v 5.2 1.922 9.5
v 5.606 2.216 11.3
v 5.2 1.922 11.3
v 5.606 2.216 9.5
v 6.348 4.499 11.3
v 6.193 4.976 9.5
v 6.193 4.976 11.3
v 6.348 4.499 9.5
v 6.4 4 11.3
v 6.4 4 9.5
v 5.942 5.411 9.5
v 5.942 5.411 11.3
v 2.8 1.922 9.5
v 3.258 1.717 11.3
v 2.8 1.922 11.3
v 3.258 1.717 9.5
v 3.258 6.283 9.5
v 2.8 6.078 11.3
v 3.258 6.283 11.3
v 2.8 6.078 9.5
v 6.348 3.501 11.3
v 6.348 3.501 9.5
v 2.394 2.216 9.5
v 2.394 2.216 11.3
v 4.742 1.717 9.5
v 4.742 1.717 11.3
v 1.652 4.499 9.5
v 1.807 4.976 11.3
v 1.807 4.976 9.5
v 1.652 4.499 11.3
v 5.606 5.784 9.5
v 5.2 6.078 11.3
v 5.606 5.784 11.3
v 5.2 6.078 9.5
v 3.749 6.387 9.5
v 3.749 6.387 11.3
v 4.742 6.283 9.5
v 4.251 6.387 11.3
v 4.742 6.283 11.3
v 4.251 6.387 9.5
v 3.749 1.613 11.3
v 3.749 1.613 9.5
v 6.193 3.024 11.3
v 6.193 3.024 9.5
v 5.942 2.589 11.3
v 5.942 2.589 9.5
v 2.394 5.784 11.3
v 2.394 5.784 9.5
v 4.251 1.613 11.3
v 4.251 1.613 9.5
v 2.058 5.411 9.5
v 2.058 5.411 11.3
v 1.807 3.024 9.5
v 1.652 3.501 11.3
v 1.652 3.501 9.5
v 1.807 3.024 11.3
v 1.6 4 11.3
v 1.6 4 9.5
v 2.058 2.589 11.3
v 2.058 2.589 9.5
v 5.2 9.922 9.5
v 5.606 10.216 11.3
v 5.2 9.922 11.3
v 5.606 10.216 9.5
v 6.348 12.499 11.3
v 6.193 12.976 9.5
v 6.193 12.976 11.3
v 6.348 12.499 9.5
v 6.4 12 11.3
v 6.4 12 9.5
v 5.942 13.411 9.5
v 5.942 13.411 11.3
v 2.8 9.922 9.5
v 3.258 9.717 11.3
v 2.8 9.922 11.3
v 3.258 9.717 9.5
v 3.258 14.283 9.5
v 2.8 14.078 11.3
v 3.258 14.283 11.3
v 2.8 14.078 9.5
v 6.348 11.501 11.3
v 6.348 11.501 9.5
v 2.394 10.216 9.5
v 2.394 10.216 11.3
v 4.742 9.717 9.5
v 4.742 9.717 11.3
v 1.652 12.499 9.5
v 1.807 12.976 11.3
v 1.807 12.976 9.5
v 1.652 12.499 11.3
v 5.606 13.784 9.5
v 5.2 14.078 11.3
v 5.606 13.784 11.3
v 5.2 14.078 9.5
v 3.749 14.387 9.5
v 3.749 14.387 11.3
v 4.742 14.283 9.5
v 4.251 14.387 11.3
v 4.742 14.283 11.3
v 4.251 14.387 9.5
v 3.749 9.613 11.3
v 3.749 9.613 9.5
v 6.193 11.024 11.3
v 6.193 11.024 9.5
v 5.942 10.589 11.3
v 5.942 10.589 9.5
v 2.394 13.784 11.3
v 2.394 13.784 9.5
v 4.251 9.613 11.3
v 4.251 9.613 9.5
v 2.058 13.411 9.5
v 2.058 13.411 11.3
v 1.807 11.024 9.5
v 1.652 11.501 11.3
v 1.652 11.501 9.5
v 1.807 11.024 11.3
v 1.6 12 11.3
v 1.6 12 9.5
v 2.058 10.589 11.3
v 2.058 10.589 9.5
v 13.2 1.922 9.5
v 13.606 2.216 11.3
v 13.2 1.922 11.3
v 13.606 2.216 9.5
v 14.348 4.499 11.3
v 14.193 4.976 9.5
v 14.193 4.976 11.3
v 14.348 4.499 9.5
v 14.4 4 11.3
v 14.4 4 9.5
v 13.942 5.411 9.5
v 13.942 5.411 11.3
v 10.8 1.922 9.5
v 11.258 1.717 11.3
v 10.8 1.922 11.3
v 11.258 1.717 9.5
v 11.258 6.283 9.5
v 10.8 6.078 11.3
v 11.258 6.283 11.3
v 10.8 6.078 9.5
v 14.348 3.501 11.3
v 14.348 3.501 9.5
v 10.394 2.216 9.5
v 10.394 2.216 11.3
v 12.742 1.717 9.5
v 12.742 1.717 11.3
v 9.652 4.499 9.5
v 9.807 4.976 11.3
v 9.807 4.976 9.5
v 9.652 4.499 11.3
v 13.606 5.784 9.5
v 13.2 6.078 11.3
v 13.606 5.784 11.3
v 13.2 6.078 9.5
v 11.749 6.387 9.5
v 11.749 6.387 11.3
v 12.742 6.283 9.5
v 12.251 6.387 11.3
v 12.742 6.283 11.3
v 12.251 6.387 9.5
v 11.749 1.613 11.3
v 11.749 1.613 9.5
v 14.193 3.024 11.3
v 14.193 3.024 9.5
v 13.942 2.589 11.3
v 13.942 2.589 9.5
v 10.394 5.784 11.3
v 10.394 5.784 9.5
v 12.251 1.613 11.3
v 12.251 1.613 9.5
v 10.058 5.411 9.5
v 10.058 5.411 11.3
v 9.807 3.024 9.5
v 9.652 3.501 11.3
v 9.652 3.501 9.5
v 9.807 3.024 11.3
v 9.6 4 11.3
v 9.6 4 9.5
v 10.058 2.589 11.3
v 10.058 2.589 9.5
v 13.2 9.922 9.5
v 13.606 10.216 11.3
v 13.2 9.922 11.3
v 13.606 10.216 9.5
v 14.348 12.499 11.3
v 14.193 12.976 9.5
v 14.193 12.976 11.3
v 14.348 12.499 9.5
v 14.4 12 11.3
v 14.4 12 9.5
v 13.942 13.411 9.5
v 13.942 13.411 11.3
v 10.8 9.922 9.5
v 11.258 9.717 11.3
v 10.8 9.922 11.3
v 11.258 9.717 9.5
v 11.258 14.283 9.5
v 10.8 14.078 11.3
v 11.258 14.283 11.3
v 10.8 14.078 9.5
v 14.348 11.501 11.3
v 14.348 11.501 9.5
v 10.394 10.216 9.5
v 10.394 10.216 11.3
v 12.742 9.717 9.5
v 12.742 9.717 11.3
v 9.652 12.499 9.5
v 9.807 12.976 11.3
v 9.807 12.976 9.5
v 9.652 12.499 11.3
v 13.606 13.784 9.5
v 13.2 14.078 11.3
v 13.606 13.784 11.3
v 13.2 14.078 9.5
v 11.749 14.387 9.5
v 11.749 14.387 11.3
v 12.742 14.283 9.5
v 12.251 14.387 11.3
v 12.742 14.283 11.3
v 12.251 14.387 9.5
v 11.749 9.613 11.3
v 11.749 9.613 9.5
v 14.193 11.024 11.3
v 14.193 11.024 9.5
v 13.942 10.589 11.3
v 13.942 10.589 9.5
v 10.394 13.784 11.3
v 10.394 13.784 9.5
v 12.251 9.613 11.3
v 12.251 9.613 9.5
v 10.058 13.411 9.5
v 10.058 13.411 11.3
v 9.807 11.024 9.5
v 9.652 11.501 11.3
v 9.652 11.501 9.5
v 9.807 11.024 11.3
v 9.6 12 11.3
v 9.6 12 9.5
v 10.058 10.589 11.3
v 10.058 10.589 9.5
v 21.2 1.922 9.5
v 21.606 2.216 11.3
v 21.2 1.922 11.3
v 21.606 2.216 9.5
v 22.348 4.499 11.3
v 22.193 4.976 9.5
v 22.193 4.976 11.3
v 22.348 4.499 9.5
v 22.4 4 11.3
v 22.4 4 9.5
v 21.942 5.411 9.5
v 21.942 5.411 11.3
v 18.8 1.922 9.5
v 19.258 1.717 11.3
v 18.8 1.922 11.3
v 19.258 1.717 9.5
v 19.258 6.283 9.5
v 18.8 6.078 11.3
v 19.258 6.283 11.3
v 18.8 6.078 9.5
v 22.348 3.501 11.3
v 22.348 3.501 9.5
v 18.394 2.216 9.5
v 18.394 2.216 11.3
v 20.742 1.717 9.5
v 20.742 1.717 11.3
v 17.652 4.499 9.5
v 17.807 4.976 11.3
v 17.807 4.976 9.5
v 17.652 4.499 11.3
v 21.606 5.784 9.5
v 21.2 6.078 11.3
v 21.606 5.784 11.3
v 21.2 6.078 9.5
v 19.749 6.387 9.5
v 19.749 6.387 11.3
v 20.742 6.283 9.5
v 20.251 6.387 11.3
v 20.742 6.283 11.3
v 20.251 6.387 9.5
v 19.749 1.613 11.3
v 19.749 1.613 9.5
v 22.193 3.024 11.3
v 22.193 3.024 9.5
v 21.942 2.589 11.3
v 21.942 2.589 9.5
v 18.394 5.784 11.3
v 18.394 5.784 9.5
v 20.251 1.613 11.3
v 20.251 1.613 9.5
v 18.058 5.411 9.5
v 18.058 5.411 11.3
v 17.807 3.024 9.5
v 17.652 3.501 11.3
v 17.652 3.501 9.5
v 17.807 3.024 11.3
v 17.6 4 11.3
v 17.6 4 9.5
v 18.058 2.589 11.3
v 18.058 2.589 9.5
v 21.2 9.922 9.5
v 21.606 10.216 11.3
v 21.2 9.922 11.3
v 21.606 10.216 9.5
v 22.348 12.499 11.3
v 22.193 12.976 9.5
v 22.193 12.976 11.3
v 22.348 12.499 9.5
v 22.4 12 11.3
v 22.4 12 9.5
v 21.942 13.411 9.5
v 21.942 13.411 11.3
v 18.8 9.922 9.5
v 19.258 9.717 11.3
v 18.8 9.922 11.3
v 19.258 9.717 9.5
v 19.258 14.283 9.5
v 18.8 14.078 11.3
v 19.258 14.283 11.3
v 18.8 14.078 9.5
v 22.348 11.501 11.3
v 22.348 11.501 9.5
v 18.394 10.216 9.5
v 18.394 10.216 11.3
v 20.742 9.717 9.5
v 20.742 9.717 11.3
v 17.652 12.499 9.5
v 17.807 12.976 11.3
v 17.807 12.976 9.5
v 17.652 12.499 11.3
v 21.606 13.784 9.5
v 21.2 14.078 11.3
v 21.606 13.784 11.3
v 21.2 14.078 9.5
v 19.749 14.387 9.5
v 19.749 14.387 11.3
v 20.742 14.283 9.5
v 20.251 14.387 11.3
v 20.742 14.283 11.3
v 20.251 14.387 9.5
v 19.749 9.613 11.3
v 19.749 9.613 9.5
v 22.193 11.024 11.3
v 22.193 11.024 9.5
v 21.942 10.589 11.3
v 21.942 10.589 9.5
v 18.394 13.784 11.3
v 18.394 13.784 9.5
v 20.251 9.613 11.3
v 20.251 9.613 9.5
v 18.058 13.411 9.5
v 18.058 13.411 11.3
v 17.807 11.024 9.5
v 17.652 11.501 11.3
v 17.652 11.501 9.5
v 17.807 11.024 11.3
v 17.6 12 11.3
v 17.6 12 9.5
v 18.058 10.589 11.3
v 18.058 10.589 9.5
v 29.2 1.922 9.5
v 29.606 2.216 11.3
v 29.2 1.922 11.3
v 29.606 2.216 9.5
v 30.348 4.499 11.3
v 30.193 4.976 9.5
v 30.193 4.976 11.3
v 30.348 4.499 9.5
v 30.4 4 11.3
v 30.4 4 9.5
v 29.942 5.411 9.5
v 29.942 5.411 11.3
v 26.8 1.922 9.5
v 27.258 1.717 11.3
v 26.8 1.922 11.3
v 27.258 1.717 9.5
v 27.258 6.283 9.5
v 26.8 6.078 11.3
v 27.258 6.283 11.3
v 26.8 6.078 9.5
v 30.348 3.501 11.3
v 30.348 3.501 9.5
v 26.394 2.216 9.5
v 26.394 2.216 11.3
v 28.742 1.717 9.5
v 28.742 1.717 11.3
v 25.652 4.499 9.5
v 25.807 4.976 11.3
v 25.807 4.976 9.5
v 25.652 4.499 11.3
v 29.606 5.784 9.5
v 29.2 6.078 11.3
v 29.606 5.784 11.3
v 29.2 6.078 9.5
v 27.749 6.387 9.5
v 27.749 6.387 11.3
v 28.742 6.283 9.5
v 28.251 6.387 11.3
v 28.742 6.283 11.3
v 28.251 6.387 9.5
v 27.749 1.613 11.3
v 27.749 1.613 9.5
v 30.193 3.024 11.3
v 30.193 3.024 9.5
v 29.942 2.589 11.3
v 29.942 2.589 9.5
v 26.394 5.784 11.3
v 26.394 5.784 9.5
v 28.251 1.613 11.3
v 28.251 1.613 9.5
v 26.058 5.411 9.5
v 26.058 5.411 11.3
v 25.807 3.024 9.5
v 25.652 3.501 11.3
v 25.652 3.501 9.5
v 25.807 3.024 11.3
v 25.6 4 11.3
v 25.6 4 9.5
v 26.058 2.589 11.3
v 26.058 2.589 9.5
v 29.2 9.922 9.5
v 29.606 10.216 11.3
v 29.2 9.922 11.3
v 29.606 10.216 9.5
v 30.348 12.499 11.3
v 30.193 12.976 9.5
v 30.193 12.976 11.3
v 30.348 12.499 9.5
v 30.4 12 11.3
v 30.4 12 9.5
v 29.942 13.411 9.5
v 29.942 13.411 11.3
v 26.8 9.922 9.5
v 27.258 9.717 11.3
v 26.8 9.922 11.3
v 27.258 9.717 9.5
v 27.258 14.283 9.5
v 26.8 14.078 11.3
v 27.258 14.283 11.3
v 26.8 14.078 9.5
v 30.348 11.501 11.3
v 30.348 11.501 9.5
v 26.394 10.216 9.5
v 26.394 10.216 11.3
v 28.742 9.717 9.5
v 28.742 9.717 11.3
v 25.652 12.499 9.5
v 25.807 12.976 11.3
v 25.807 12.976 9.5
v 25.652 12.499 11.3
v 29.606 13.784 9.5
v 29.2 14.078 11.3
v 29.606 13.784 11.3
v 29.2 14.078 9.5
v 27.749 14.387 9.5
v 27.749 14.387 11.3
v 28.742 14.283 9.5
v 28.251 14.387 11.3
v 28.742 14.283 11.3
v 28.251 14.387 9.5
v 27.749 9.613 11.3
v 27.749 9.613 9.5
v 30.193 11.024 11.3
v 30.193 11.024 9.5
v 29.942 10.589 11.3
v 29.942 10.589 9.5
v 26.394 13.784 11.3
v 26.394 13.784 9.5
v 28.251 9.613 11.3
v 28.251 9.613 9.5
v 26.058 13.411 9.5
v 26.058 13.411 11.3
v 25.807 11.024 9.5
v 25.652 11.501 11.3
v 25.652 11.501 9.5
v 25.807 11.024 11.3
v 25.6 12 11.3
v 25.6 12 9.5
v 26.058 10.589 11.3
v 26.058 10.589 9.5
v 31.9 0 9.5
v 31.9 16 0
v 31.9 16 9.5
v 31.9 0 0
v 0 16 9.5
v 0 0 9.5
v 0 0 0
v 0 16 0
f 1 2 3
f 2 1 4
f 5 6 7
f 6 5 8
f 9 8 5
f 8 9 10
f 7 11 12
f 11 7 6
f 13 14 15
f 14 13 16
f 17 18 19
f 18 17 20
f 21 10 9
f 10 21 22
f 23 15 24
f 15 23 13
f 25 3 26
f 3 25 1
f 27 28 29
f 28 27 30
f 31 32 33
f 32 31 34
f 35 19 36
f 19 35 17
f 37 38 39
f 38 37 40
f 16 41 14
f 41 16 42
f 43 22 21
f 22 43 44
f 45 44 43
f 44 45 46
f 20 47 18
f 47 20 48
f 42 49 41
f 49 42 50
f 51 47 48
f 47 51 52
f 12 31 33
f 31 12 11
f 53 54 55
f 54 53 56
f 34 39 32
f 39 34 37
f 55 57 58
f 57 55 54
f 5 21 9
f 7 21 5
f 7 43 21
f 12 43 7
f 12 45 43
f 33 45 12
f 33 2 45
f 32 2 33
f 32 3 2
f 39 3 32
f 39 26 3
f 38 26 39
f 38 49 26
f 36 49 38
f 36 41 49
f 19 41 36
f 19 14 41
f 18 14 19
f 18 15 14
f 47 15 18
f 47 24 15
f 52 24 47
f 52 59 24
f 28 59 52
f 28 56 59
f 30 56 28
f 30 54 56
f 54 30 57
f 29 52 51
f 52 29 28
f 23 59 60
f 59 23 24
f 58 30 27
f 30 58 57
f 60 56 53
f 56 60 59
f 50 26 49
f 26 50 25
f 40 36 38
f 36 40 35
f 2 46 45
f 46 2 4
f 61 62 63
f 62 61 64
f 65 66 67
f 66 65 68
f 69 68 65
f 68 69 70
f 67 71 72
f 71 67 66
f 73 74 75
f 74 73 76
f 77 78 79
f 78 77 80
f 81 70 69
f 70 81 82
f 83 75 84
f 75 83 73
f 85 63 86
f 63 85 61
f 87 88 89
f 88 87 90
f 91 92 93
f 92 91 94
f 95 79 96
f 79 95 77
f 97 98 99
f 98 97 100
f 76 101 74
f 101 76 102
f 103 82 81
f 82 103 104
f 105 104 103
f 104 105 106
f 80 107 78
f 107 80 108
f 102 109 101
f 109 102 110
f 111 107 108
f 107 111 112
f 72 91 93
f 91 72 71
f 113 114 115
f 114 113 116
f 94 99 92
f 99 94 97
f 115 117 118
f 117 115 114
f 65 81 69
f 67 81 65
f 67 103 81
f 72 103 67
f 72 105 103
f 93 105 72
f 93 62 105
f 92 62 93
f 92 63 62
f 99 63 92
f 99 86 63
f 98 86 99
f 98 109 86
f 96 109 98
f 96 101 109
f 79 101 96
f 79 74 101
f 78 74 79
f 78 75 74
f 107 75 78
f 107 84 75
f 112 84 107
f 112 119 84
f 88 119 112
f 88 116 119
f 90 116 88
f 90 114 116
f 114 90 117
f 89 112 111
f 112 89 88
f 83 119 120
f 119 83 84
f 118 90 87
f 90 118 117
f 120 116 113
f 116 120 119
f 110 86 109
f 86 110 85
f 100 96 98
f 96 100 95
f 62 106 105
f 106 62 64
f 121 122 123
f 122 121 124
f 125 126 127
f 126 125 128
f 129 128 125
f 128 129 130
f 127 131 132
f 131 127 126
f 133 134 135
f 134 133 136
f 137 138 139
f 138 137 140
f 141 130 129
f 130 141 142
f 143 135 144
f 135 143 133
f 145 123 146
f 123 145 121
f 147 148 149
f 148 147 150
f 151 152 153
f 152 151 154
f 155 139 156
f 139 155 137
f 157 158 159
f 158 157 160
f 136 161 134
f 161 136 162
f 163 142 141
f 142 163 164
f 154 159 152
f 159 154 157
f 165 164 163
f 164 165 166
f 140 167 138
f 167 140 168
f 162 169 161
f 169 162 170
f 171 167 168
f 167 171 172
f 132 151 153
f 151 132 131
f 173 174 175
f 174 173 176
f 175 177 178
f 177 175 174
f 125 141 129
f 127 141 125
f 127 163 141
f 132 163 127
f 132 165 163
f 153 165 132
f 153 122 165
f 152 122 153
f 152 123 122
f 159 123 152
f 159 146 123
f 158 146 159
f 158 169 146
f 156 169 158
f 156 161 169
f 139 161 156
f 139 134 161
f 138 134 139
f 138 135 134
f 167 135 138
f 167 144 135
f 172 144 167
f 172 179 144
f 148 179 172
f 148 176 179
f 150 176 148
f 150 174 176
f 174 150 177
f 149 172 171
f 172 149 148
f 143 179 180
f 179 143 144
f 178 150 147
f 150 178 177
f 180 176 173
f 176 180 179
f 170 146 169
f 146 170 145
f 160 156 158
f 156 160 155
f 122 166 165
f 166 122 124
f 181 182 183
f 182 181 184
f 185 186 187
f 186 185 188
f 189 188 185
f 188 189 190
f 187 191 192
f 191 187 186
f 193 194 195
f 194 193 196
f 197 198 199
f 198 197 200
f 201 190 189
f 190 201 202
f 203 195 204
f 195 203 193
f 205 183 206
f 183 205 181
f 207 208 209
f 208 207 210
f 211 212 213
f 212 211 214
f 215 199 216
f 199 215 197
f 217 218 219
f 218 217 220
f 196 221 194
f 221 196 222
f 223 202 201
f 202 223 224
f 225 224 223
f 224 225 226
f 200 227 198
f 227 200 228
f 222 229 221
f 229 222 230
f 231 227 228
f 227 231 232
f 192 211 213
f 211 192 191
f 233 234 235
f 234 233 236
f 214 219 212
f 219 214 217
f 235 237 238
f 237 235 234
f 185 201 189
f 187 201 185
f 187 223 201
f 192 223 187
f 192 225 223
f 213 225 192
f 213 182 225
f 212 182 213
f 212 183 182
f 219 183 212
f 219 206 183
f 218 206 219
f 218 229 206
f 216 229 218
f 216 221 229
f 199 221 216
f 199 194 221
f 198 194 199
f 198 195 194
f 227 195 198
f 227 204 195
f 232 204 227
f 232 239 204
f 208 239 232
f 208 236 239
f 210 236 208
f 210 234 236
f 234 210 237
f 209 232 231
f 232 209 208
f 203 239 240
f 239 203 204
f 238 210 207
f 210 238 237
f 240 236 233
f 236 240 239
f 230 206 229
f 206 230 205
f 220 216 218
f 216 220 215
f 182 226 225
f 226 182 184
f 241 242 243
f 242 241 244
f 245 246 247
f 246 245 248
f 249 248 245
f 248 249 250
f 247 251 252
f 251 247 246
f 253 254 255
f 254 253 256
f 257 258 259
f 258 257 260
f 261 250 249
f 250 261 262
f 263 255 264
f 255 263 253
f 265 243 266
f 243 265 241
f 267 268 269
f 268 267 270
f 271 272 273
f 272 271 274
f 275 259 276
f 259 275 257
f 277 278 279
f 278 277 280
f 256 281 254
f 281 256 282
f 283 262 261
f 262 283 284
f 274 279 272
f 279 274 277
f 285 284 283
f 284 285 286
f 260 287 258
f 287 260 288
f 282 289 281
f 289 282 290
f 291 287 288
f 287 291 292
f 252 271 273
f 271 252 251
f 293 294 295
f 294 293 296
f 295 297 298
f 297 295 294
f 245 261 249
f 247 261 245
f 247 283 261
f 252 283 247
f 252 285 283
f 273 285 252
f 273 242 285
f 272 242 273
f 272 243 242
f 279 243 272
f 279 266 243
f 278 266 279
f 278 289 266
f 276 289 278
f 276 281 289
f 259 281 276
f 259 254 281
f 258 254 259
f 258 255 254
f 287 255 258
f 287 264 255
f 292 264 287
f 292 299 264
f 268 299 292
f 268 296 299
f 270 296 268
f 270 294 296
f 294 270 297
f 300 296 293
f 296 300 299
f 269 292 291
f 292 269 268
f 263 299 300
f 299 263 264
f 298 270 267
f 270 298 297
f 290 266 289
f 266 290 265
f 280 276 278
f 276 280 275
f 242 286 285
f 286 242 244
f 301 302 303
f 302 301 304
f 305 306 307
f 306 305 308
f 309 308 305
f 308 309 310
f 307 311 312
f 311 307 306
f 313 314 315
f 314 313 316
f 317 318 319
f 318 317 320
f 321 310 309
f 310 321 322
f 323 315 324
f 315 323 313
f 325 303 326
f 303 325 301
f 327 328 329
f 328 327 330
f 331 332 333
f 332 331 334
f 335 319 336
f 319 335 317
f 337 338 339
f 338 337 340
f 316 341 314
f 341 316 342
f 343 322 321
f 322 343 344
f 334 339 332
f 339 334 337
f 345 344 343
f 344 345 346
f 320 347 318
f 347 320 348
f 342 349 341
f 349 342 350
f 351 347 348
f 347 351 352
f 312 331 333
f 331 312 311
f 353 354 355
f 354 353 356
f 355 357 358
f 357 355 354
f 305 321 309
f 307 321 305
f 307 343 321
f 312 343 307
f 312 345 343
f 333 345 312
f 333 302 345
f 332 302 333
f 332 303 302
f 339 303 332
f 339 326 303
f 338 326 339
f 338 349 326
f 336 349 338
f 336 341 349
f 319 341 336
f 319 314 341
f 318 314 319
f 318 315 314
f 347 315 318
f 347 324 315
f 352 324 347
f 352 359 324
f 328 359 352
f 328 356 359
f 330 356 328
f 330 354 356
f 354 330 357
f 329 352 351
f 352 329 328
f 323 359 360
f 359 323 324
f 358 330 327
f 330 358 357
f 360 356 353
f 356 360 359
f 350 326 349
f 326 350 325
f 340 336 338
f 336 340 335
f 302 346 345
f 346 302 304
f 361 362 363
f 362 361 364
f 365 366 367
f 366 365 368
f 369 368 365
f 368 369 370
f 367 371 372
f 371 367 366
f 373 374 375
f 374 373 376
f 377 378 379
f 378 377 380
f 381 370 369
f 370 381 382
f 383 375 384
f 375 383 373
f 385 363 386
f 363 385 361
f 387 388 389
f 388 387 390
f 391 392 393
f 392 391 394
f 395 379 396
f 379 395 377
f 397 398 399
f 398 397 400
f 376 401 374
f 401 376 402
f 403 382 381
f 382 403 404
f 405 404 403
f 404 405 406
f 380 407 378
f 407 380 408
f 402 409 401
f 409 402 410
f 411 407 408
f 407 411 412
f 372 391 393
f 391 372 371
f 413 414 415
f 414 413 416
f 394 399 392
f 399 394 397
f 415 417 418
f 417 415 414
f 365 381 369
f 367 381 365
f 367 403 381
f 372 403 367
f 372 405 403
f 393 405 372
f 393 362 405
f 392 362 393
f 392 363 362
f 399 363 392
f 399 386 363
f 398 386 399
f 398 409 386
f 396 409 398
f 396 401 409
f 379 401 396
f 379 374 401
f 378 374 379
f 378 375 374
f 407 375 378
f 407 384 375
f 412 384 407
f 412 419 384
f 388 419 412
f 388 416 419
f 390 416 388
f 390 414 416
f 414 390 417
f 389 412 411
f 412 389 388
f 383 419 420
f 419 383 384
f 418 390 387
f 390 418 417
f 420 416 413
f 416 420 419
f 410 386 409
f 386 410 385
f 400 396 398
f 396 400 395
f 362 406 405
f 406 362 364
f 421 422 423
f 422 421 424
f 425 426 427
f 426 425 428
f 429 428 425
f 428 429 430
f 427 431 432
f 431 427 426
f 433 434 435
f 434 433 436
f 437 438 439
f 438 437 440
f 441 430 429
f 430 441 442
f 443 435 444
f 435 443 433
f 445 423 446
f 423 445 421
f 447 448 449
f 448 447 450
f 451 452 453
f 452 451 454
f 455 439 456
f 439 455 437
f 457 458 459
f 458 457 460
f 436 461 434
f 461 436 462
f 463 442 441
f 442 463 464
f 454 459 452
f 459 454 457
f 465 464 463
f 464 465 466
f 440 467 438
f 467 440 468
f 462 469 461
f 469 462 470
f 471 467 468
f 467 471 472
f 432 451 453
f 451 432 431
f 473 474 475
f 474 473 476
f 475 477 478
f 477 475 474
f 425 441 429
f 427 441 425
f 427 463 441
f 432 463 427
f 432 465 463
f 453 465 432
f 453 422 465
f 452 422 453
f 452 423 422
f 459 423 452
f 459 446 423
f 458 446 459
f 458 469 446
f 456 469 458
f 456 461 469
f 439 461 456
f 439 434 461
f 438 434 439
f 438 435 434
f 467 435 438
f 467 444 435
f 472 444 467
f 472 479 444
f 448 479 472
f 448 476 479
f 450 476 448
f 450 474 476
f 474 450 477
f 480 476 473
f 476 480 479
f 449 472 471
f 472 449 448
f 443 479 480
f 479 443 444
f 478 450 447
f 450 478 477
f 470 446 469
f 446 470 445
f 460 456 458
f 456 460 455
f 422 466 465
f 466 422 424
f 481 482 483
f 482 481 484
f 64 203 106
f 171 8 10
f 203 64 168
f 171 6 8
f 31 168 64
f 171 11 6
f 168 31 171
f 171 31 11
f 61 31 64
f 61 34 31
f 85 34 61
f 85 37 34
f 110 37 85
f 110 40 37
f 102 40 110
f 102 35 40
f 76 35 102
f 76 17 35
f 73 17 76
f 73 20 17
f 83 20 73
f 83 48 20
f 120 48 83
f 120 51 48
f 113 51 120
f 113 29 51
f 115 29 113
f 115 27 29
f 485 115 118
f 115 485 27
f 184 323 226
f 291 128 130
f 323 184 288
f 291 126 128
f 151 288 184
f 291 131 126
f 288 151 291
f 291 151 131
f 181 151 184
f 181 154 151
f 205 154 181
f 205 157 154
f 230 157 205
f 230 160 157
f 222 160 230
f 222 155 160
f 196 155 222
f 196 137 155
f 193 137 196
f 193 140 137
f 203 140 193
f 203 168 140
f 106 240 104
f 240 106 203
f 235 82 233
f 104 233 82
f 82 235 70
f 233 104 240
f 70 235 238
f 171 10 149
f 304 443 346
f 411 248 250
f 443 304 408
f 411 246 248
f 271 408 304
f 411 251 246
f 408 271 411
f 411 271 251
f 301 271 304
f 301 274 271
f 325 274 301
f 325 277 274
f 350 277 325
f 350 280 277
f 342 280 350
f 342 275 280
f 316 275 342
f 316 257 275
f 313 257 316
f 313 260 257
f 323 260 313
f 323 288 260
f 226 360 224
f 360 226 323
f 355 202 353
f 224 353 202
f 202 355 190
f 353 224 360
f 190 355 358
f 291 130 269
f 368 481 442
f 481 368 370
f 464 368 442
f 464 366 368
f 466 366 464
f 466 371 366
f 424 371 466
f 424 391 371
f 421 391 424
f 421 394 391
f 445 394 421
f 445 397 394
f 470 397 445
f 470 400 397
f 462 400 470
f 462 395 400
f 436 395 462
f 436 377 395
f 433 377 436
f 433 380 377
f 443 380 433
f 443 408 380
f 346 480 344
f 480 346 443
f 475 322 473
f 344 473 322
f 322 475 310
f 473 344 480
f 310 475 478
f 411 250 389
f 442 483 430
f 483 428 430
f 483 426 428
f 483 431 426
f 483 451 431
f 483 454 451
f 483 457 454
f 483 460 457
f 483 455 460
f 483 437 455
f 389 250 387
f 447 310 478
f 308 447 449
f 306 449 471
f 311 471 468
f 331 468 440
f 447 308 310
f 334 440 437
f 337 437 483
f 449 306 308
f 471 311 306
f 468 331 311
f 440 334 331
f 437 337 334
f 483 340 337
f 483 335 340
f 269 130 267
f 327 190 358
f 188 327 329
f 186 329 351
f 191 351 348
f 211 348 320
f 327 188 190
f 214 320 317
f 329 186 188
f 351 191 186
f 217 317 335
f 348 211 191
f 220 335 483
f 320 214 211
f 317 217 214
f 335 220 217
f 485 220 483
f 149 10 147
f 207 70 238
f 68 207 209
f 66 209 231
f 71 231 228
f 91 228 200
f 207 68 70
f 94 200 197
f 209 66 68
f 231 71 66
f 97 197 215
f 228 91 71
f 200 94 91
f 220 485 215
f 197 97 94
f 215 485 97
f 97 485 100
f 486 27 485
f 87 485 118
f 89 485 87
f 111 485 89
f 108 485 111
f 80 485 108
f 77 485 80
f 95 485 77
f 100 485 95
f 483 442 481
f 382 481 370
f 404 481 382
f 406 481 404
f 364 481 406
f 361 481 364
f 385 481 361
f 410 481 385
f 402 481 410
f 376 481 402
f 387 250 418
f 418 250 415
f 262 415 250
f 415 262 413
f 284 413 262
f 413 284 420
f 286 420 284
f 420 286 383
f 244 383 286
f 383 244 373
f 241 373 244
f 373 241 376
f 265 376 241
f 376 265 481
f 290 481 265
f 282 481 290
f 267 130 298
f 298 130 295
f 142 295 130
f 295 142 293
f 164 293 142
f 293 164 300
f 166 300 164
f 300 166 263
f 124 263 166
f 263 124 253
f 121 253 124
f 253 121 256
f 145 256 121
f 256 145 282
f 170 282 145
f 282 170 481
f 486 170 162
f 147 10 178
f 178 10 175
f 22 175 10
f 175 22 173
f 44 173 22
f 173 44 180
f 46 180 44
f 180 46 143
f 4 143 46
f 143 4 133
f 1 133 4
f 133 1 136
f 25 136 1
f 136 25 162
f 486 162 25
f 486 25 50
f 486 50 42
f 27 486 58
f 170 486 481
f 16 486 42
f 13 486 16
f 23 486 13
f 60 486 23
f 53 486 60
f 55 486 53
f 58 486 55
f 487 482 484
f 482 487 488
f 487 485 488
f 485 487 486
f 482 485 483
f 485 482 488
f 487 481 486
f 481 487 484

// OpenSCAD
LEGObrick();

module LEGObrick(studs_per_row=4) {
    $fn=30;
    
    width = studs_per_row * 8;

    cube([width-0.1, 16, 9.5]);
    
    for (x_position=[4 : 8 : width-4]) {
        translate([x_position, 4, 1.7]) cylinder(h=9.6, d=4.8);
        translate([x_position, 12, 1.7]) cylinder(h=9.6, d=4.8);
    }
}
